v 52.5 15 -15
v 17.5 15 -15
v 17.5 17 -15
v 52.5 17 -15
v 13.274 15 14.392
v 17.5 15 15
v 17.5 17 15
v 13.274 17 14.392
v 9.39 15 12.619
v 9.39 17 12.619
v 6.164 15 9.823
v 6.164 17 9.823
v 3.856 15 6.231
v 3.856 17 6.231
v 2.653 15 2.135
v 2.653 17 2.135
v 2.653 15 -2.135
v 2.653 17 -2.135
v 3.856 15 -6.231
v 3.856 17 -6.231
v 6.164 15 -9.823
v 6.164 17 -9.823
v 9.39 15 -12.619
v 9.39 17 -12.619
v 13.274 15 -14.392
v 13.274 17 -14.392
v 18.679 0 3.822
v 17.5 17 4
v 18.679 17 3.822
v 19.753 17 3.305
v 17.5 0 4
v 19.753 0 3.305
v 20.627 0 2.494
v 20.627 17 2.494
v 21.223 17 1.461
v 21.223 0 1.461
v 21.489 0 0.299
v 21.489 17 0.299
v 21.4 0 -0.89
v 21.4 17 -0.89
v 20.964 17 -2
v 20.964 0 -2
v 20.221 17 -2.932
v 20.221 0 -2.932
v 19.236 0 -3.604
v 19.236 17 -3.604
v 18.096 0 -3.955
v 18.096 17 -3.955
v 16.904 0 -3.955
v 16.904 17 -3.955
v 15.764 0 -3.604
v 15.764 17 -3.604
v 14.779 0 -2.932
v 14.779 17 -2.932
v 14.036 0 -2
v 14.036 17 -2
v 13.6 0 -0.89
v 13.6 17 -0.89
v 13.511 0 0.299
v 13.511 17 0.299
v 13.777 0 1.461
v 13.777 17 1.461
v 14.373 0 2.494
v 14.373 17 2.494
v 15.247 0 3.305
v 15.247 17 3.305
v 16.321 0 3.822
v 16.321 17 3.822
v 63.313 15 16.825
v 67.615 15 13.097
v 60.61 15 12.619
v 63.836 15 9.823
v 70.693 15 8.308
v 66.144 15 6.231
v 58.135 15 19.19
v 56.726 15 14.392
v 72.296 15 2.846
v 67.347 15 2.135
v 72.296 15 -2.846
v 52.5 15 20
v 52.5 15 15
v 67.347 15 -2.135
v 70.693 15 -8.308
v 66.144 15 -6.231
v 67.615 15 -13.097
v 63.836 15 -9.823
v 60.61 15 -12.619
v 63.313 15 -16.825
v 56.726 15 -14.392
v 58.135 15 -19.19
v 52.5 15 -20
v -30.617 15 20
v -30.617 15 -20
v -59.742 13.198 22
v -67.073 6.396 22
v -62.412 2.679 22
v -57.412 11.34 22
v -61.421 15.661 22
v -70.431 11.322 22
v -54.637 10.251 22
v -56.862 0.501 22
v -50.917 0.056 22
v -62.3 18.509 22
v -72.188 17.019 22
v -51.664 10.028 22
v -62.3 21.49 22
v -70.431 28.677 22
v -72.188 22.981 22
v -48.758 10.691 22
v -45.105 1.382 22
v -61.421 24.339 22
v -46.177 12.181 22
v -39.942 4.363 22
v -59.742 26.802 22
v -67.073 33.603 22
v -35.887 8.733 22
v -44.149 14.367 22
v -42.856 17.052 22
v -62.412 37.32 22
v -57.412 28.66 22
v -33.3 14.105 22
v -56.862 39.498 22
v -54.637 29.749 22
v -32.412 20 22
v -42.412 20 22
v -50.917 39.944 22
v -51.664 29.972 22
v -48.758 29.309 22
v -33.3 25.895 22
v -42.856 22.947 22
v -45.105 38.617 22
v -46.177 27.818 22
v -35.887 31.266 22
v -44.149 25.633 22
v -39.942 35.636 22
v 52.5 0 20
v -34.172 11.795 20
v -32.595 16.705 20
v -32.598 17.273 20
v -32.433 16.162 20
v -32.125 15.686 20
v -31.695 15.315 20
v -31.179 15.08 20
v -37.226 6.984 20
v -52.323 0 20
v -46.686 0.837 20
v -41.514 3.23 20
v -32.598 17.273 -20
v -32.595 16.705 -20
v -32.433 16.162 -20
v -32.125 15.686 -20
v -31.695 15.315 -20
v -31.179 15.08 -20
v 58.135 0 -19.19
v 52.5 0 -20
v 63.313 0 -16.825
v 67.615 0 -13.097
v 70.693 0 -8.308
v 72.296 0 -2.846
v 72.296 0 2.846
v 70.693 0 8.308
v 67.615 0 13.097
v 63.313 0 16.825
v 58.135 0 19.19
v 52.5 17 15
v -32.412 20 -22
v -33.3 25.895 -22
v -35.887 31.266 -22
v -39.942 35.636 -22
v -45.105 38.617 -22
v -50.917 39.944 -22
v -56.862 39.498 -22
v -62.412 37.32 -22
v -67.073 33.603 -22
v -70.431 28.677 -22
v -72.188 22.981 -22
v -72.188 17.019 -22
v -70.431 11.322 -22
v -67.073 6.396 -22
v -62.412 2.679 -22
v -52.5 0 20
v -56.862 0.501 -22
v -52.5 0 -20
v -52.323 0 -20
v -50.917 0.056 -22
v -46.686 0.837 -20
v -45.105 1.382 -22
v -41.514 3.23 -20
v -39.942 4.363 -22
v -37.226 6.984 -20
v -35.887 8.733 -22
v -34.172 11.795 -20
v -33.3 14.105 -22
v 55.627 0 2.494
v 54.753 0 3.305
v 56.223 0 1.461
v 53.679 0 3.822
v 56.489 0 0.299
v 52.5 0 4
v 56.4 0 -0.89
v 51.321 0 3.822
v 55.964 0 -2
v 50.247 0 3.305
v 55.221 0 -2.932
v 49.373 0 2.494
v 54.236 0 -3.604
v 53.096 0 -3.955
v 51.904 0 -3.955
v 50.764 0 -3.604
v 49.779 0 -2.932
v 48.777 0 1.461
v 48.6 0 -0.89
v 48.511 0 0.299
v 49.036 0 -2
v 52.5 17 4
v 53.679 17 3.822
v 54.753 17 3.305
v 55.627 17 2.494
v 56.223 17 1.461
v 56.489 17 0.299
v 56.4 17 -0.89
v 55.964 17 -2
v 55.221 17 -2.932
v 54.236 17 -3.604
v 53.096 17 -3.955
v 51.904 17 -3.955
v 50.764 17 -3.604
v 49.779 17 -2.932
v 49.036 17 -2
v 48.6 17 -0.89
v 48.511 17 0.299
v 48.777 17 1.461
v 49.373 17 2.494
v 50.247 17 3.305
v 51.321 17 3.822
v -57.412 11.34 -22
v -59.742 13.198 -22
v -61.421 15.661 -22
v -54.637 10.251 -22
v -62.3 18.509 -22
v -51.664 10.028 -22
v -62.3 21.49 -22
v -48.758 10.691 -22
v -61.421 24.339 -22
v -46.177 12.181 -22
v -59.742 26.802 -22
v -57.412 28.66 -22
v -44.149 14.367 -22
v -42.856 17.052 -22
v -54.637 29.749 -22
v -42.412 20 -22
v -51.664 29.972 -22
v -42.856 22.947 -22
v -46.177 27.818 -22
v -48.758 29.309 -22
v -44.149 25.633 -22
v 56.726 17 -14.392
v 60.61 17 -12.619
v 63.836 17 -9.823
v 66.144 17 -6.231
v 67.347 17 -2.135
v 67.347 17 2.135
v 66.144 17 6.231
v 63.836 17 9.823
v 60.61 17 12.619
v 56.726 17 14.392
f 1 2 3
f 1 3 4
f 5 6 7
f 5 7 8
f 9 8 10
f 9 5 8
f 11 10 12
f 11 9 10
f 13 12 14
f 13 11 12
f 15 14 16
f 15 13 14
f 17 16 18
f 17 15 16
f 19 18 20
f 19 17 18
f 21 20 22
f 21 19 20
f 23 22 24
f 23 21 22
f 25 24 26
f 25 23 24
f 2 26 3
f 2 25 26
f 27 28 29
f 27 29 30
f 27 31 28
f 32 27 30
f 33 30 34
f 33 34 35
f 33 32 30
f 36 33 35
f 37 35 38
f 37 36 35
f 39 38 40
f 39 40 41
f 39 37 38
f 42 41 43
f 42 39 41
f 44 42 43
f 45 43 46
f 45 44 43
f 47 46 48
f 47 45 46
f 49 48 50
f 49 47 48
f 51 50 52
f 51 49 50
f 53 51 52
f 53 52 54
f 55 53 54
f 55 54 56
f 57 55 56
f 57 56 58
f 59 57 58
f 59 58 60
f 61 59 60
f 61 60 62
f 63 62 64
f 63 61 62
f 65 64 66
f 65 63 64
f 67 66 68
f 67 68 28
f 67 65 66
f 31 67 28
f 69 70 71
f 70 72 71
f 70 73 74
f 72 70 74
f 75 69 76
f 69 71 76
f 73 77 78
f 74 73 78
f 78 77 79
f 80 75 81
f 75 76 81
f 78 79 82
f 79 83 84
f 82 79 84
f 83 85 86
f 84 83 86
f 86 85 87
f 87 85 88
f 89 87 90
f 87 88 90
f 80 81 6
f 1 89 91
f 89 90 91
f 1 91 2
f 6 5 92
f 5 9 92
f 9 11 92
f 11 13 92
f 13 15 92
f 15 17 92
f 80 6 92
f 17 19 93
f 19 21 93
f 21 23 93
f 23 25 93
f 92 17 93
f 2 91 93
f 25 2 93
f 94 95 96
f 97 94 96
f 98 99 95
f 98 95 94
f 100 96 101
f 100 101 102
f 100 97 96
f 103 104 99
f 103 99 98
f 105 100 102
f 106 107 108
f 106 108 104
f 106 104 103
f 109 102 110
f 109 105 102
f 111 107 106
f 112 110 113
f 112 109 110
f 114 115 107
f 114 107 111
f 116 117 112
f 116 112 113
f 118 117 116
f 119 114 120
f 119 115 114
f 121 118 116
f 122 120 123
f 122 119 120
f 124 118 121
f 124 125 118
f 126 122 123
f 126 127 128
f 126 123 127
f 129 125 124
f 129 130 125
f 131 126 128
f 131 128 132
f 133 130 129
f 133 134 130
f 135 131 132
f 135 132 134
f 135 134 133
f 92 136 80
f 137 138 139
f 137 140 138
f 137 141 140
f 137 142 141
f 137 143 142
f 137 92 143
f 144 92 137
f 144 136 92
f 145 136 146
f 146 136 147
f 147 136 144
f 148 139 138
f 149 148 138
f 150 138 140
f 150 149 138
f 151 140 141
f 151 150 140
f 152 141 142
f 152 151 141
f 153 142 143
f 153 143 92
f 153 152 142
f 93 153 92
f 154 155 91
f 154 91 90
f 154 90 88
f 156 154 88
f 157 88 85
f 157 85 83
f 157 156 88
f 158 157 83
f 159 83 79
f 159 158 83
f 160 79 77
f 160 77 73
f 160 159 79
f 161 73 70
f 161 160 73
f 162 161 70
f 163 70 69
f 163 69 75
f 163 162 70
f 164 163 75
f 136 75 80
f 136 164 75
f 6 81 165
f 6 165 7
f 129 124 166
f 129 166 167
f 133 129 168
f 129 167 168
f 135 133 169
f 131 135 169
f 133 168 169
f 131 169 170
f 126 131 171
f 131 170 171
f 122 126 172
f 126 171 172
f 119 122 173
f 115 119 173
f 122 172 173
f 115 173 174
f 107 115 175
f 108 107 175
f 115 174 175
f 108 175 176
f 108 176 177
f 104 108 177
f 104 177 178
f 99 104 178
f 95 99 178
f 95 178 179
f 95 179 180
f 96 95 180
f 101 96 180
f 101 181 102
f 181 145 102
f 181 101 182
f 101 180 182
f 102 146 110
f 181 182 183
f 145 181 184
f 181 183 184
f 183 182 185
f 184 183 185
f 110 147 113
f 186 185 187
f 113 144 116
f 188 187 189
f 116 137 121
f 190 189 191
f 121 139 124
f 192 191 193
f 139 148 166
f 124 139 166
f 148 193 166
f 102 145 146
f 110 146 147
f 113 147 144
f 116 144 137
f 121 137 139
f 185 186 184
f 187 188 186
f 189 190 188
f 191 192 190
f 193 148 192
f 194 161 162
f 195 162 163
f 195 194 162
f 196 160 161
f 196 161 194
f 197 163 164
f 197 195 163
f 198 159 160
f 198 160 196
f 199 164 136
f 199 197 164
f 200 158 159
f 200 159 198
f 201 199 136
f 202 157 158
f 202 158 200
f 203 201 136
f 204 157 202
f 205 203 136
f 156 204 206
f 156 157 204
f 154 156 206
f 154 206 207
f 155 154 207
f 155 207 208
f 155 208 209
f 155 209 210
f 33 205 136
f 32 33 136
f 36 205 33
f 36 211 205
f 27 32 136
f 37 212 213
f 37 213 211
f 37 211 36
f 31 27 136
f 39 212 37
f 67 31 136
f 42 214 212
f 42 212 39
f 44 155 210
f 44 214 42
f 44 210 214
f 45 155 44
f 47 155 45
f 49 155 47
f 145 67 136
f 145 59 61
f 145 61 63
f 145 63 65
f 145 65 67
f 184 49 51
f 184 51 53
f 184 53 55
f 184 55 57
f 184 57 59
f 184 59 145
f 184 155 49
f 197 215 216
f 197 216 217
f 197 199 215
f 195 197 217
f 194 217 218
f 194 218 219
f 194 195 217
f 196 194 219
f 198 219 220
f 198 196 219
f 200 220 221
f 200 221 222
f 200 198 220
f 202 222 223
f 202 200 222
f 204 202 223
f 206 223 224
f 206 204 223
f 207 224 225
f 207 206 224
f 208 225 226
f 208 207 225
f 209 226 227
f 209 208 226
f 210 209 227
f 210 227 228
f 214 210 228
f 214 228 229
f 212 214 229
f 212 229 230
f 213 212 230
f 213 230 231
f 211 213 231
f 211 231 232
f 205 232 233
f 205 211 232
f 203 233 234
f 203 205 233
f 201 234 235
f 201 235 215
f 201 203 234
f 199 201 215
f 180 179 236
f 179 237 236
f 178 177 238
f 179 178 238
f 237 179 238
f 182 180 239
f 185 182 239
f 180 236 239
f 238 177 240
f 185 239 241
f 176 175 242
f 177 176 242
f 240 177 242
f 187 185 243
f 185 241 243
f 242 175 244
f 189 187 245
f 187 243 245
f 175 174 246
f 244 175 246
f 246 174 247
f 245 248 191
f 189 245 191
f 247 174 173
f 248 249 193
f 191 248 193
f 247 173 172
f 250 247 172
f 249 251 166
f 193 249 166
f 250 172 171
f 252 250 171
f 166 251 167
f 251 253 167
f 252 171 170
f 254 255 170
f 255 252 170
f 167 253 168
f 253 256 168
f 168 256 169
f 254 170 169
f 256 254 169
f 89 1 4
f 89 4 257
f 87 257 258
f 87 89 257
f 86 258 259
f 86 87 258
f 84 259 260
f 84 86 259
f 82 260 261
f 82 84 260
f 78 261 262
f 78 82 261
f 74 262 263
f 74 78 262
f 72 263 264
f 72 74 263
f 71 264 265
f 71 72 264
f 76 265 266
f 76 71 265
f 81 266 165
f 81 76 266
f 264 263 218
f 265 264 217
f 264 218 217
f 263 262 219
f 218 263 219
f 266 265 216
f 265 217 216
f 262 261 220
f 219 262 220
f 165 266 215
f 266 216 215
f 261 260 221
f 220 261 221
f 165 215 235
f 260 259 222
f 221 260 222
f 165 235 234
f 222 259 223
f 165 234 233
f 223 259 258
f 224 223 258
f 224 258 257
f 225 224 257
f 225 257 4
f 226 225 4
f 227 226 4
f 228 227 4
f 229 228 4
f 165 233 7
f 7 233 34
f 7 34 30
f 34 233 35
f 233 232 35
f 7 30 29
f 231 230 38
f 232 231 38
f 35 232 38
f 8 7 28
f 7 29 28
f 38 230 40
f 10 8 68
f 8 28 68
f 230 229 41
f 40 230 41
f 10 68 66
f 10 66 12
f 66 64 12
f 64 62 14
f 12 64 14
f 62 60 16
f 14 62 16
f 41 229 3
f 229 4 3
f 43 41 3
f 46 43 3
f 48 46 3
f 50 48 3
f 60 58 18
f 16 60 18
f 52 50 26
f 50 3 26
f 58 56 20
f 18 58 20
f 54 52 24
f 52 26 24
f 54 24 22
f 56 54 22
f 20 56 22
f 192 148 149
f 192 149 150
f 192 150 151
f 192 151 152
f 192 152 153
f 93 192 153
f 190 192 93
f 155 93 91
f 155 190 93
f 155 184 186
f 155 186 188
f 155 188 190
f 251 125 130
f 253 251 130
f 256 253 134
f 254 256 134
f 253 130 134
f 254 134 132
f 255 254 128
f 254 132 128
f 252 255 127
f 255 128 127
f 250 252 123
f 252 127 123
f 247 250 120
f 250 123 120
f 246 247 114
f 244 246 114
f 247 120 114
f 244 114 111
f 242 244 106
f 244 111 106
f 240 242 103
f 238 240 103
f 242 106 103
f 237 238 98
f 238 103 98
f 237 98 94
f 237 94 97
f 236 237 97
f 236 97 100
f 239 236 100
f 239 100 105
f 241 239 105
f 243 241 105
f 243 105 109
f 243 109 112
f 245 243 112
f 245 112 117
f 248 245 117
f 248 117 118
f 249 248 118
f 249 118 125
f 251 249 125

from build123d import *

# Parameters (mm, degrees)
SKETCH1_R                = 4
BOSS_EXTRUDE1_DEPTH      = 15
BOSS_EXTRUDE2_DEPTH      = 22
BOSS_EXTRUDE2_DEPTH_BACK = 22
SKETCH3_R                = 20
SKETCH4_R                = 10
CUT_EXTRUDE1_DEPTH       = 94.766915104
SKETCH5_R                = 4
BOSS_EXTRUDE3_DEPTH      = 2
FILLET2_R                = 2


with BuildPart() as part:
    # Sketch1 → Boss-Extrude1 (new body)
    with BuildSketch(Plane(origin=(0, 0, 0), x_dir=(1, 0, 0), z_dir=(0, 1, 0))):
        with BuildLine():
            Line((-52.5, 20), (52.5, 20))
            ThreePointArc((52.5, 20), (72.5, 0), (52.5, -20))
            Line((52.5, -20), (-52.5, -20))
            Line((-52.5, -20), (-52.5, 20))
        make_face()
        with Locations(Location((17.5, 0, 0), (0, 0, 270))):
            Circle(SKETCH1_R, mode=Mode.SUBTRACT)
        with Locations(Location((52.5, 0, 0), (0, 0, 270))):
            Circle(SKETCH1_R, mode=Mode.SUBTRACT)
    extrude(amount=BOSS_EXTRUDE1_DEPTH)

    # Sketch3 → Boss-Extrude2 (add, two sides: drawn at the far end of the back side and taken through both)
    with BuildSketch(Plane.XY.offset(-BOSS_EXTRUDE2_DEPTH_BACK)):
        with Locations((-52.411592251, 19.999804601)):
            Circle(SKETCH3_R)
    extrude(amount=BOSS_EXTRUDE2_DEPTH + BOSS_EXTRUDE2_DEPTH_BACK)

    # Sketch4 → Cut-Extrude1 (cut, through all)
    with BuildSketch(Plane.XY.offset(22)):
        with Locations((-52.411592251, 19.999804601)):
            Circle(SKETCH4_R)
    extrude(amount=-CUT_EXTRUDE1_DEPTH, mode=Mode.SUBTRACT)

    # Sketch5 → Boss-Extrude3 (add)
    with BuildSketch(Plane(origin=(0, 15, 0), x_dir=(1, 0, 0), z_dir=(0, 1, 0))):
        with BuildLine():
            Line((17.5, 15), (52.5, 15))
            ThreePointArc((52.5, 15), (67.5, 0), (52.5, -15))
            Line((52.5, -15), (17.5, -15))
            ThreePointArc((17.5, -15), (2.5, 0), (17.5, 15))
        make_face()
        with Locations(Location((17.5, 0, 0), (0, 0, 270))):
            Circle(SKETCH5_R, mode=Mode.SUBTRACT)
        with Locations(Location((52.5, 0, 0), (0, 0, 270))):
            Circle(SKETCH5_R, mode=Mode.SUBTRACT)
    extrude(amount=BOSS_EXTRUDE3_DEPTH)

    # Fillet2
    fillet2_edges = [part.edges().sort_by_distance(p)[0] for p in [
        (-33.046625069, 15, 0),
    ]]
    fillet(fillet2_edges, radius=FILLET2_R)


solid = part.part
